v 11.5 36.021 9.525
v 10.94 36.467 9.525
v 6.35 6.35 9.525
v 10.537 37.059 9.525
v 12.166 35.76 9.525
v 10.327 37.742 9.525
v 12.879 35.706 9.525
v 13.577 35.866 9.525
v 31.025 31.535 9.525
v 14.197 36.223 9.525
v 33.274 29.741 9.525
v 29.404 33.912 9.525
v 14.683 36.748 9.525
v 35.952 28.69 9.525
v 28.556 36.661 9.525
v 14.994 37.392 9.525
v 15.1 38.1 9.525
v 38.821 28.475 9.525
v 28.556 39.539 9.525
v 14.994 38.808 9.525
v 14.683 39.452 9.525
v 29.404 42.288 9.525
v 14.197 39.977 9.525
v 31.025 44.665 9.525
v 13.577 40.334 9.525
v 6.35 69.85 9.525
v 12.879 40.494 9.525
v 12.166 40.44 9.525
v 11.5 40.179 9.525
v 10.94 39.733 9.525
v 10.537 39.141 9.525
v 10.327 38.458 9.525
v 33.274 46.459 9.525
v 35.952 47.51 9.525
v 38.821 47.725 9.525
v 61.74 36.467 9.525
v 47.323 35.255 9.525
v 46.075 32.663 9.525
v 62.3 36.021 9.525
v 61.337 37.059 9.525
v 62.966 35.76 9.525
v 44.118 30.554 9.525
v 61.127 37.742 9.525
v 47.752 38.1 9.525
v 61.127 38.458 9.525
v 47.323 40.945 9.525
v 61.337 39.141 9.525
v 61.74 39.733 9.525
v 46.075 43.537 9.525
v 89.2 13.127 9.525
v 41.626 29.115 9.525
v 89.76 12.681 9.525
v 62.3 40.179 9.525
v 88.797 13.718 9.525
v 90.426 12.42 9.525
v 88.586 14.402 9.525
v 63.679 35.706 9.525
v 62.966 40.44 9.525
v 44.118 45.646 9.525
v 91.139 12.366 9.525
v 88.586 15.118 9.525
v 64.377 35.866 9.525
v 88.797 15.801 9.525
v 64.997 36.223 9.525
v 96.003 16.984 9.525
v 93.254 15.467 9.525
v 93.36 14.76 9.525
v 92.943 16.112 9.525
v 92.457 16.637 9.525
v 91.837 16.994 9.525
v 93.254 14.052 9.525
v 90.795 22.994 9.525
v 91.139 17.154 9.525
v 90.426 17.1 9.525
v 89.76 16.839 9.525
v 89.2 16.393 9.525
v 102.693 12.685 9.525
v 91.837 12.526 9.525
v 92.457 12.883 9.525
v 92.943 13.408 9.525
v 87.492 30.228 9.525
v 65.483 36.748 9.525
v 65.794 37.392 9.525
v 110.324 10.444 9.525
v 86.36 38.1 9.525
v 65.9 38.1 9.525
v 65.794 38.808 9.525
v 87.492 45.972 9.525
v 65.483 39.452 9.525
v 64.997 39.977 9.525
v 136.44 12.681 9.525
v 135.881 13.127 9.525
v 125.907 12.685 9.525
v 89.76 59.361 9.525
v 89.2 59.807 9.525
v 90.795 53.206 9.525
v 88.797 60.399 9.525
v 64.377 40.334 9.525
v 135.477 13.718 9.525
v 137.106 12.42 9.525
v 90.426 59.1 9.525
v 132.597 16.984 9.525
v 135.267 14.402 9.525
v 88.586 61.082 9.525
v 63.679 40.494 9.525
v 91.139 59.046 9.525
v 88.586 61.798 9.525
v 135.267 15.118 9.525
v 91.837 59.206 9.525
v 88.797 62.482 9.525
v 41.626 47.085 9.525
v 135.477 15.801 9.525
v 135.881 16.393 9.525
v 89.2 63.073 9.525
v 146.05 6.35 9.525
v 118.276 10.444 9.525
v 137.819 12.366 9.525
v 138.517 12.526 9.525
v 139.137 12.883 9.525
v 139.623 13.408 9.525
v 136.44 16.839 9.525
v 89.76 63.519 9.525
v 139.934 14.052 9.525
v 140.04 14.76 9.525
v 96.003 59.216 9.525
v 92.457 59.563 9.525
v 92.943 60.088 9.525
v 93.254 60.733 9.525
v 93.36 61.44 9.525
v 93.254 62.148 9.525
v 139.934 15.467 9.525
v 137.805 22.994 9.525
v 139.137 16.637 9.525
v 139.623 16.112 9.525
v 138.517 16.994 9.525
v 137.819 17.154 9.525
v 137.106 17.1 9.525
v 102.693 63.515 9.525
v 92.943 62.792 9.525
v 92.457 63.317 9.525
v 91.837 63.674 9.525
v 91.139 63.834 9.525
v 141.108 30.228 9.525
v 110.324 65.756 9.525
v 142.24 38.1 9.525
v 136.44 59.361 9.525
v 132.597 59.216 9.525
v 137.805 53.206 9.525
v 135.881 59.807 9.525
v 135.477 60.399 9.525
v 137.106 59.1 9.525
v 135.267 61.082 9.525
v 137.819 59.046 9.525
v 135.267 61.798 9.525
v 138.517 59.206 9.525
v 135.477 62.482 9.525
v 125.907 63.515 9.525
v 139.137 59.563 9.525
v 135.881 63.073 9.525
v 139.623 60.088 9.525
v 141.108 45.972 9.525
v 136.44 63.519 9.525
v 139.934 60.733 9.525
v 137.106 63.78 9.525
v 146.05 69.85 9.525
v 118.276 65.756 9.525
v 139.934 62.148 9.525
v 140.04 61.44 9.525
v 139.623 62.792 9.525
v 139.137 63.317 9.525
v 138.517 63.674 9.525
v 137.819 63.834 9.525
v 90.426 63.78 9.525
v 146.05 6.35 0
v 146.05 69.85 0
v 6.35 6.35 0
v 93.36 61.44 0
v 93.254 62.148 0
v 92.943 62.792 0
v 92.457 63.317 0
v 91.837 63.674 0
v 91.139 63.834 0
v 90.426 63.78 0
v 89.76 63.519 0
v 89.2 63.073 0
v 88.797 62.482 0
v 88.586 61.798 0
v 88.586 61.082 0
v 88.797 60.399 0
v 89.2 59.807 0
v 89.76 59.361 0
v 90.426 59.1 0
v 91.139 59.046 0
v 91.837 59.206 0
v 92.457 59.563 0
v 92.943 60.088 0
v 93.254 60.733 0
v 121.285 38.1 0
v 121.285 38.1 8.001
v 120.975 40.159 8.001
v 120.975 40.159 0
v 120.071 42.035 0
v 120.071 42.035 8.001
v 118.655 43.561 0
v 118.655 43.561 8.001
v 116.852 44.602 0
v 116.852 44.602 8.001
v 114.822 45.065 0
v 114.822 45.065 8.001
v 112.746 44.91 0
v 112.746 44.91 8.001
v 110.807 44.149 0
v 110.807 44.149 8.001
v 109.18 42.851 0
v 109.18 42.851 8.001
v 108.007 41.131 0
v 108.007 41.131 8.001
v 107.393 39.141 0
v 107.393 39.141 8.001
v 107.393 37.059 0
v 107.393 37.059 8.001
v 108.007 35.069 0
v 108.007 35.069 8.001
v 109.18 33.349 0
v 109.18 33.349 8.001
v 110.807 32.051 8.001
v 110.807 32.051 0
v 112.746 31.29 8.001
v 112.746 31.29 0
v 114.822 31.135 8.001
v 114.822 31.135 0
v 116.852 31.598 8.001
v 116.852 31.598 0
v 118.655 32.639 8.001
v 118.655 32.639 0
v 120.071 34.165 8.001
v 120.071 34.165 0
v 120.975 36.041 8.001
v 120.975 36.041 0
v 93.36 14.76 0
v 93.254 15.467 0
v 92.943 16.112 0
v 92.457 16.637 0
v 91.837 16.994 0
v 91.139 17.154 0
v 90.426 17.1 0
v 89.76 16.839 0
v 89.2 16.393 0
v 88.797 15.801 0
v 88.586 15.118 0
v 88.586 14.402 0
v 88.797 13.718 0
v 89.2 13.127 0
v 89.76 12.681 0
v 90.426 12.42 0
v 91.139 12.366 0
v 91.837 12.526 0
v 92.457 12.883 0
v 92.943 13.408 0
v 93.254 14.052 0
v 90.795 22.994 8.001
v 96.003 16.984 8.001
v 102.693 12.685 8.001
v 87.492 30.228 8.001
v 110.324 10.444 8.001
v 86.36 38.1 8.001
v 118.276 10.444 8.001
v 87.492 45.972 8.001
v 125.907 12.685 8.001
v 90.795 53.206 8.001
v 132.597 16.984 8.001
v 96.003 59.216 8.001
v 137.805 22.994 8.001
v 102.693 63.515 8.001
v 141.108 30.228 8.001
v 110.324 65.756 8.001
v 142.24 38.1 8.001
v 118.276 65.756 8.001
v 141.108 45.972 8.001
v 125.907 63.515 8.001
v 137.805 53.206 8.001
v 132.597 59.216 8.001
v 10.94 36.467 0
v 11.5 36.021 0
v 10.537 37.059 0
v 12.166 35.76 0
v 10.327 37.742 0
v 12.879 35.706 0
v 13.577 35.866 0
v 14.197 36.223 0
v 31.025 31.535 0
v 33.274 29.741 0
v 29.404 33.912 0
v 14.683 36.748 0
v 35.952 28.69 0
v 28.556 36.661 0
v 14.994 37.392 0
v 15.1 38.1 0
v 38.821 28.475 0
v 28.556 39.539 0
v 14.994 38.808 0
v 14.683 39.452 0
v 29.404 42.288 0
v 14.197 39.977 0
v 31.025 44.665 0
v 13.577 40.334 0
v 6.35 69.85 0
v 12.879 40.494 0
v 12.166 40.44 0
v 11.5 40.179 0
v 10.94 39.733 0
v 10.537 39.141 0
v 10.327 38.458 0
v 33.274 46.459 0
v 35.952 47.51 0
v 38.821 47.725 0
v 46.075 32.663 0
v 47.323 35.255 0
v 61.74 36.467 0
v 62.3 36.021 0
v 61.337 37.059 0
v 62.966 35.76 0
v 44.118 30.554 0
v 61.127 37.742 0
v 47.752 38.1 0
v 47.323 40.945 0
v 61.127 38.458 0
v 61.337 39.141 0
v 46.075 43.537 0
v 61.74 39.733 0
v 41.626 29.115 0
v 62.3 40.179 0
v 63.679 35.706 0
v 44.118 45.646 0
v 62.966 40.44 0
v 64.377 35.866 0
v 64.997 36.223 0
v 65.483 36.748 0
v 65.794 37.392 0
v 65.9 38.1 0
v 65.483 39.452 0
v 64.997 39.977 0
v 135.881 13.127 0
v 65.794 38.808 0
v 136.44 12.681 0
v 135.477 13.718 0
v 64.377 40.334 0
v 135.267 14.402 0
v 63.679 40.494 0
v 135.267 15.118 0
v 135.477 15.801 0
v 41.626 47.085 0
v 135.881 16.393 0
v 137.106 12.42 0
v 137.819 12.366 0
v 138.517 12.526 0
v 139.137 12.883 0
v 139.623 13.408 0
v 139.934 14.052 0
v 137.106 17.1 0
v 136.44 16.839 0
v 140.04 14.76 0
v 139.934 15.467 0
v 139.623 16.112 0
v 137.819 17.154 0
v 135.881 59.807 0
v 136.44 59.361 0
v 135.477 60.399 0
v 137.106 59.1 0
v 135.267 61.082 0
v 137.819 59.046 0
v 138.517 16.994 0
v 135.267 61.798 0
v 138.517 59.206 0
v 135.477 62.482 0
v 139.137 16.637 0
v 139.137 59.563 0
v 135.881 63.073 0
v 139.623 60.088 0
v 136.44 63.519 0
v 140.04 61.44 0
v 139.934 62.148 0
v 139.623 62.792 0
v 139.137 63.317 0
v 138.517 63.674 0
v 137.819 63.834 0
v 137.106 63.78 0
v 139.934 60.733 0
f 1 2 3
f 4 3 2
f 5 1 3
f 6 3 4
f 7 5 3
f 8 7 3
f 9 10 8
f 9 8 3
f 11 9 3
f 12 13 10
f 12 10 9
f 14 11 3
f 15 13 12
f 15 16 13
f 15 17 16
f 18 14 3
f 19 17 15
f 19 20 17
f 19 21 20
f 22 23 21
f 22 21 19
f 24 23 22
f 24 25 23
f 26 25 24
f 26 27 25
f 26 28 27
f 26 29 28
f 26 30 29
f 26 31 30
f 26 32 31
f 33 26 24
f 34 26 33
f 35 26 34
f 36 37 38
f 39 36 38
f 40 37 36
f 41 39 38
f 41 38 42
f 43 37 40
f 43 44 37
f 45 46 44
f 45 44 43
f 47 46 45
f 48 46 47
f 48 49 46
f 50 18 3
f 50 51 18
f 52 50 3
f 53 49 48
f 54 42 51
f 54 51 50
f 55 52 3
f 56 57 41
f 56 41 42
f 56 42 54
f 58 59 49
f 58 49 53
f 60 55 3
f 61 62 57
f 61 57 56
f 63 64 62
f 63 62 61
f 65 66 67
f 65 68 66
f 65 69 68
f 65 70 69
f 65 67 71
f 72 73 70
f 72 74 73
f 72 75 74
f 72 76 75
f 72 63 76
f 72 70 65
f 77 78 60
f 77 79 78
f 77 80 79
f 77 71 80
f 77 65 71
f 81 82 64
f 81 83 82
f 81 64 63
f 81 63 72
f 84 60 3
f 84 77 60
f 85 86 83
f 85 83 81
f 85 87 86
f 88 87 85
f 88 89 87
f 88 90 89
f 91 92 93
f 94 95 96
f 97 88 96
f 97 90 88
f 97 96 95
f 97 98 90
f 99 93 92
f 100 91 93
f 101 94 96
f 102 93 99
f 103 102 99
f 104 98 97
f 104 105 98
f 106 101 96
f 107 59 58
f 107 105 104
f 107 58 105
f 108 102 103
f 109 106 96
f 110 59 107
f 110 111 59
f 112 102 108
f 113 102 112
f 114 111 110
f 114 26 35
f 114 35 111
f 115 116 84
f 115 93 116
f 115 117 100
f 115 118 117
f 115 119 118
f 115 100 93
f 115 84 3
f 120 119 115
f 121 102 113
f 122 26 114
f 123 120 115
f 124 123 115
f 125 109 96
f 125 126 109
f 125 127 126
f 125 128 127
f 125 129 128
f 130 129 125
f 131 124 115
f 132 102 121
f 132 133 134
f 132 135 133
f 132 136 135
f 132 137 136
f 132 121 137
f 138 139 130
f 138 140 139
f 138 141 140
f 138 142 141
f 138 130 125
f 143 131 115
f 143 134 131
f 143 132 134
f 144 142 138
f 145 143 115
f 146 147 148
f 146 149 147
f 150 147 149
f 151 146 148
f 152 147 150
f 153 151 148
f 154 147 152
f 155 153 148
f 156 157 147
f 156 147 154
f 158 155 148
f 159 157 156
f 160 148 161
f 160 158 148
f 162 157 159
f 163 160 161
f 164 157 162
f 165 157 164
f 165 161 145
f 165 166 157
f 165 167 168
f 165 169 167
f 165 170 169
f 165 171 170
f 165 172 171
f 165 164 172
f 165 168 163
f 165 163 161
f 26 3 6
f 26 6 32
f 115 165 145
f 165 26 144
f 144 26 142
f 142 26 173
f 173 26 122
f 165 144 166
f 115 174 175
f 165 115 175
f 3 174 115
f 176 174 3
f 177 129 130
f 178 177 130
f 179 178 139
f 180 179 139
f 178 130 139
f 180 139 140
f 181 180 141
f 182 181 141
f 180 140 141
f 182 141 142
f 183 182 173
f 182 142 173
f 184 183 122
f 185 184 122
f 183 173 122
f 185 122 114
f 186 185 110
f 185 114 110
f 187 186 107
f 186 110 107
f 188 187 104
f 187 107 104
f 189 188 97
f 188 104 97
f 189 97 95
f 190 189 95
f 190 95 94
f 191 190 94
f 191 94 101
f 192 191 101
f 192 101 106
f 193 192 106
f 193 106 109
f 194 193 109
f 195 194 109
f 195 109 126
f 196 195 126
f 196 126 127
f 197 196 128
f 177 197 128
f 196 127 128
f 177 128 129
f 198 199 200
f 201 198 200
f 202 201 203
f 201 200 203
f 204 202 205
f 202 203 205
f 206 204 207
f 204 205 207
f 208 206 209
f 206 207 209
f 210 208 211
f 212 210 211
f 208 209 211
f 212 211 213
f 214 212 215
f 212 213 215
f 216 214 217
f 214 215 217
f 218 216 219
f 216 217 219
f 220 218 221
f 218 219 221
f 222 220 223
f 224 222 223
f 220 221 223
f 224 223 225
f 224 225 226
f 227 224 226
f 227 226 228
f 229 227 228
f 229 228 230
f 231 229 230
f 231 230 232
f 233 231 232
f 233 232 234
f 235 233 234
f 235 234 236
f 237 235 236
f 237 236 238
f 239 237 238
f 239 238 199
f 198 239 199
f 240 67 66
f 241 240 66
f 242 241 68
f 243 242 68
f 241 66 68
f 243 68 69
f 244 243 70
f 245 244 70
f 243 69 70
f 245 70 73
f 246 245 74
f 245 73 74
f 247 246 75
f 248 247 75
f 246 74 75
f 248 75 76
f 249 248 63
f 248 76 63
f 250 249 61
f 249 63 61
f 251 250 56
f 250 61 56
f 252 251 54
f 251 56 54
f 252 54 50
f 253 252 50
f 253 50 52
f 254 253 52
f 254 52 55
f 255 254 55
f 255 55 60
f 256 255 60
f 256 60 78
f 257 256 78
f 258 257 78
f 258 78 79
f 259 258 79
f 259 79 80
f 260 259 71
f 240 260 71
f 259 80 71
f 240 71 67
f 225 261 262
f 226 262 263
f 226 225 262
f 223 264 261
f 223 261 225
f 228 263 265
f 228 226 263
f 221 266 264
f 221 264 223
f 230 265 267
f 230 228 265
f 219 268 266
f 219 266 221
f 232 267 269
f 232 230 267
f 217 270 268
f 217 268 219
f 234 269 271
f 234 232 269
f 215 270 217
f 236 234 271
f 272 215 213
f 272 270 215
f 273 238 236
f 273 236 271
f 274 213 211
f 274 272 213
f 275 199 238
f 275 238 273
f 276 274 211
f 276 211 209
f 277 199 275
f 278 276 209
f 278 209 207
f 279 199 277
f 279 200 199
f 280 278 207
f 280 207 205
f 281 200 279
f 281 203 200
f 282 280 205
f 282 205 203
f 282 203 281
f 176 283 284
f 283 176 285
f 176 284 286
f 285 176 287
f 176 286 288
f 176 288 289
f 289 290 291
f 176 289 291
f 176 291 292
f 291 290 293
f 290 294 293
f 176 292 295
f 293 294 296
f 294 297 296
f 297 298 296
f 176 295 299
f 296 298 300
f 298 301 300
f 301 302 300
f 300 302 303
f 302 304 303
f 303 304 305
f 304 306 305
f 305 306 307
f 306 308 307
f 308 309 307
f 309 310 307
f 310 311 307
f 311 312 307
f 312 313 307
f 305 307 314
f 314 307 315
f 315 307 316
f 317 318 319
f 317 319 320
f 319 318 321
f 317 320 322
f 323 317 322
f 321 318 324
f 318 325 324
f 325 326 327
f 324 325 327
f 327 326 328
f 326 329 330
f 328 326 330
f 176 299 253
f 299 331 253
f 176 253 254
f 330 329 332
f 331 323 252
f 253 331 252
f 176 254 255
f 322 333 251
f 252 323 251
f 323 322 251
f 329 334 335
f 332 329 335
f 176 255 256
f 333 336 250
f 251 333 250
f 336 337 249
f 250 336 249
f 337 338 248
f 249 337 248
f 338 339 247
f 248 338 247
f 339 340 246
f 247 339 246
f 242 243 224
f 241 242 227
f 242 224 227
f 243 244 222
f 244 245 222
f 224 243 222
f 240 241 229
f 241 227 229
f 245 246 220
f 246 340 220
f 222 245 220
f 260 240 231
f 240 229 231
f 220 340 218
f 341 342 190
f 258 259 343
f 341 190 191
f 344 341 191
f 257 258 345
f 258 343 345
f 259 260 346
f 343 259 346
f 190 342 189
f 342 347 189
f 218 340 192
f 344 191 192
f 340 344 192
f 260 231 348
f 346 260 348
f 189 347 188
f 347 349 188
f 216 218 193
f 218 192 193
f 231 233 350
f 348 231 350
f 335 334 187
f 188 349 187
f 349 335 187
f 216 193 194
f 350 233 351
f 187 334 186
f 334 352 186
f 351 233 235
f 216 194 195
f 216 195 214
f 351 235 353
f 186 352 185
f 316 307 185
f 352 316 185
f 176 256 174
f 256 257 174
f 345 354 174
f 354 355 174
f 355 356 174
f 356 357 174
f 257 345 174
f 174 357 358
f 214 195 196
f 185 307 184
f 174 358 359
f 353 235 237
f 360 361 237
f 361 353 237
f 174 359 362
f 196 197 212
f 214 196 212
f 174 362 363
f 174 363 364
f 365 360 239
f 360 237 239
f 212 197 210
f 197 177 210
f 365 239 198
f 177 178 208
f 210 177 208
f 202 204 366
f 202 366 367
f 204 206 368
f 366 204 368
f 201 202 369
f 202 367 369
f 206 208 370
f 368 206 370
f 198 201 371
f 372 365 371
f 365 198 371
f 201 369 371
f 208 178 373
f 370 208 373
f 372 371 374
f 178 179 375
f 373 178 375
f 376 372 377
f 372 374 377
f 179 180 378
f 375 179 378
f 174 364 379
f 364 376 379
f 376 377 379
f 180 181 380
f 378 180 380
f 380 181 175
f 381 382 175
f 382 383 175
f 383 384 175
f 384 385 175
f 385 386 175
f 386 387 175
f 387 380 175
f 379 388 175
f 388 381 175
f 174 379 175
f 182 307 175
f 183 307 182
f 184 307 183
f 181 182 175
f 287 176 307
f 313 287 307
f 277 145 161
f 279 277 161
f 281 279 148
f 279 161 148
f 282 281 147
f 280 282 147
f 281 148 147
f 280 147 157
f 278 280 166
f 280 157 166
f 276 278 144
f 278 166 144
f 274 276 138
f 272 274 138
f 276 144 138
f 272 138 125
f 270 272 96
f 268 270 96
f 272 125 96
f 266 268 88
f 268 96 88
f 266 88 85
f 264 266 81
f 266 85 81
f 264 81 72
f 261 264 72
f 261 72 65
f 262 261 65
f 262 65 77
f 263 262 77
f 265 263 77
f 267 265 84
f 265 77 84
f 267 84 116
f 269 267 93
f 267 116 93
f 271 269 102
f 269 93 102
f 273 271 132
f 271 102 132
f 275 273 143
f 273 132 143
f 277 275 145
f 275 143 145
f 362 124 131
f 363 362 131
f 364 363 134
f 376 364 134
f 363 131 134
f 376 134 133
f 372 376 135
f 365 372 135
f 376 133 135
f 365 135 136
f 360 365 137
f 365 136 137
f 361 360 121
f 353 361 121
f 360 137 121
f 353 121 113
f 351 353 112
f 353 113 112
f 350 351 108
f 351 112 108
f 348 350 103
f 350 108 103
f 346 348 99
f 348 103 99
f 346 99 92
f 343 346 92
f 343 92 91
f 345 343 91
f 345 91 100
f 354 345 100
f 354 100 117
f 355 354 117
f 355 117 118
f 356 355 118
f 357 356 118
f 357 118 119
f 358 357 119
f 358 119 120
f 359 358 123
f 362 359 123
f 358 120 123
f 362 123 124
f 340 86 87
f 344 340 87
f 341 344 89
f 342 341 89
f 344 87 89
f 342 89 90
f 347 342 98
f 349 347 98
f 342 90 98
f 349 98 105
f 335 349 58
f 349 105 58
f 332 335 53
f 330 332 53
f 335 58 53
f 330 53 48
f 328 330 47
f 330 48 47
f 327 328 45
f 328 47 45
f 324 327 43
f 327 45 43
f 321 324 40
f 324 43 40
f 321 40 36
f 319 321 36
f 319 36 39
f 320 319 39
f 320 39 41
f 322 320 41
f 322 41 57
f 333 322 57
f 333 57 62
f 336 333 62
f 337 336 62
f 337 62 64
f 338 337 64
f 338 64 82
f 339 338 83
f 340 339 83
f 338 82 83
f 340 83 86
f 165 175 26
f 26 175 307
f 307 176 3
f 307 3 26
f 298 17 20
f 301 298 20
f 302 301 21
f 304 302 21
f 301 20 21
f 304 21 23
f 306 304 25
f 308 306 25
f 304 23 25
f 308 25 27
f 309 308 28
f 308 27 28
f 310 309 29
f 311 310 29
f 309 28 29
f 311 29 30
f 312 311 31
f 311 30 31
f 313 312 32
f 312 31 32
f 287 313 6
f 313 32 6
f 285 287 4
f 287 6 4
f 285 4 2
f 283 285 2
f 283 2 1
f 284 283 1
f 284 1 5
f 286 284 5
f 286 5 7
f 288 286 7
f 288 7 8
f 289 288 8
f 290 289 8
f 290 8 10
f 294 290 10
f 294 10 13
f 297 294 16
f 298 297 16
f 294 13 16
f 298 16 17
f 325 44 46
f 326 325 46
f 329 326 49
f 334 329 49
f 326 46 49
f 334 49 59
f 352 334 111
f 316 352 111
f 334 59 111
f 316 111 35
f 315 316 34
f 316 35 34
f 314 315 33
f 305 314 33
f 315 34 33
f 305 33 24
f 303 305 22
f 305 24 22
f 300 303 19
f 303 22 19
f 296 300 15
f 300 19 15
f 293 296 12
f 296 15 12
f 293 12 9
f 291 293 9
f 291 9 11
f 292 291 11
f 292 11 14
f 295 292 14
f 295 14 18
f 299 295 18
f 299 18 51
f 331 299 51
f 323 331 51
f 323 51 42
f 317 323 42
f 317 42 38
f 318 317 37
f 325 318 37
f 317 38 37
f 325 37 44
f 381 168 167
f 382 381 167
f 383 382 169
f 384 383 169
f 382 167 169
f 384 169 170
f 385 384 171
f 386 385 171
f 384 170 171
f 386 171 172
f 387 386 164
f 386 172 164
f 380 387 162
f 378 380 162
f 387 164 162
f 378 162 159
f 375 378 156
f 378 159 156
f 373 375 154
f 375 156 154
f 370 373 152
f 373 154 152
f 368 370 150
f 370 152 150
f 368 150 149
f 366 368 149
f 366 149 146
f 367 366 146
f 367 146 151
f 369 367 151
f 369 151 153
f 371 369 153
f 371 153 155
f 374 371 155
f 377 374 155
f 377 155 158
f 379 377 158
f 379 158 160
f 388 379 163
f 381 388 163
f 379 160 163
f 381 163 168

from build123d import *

# Parameters (mm, degrees)
SKETCH1_W           = 152.4
SKETCH1_H           = 76.2
BOSS_EXTRUDE1_DEPTH = 9.525
SKETCH2_R           = 9.652
SKETCH2_R_2         = 6.985
SKETCH2_R_3         = 2.4003
CUT_EXTRUDE1_DEPTH  = 9.525
SKETCH3_R           = 27.94
CUT_EXTRUDE2_DEPTH  = 1.524
SKETCH4_W           = 152.4
SKETCH4_H           = 76.2
SKETCH4_W_2         = 139.7
SKETCH4_H_2         = 63.5
CUT_EXTRUDE3_DEPTH  = 10.525


with BuildPart() as part:
    # Sketch1 → Boss-Extrude1 (new body)
    with BuildSketch(Plane.XY):
        with Locations((76.2, 38.1)):
            Rectangle(SKETCH1_W, SKETCH1_H)
    extrude(amount=BOSS_EXTRUDE1_DEPTH)

    # Sketch2 → Cut-Extrude1 (cut)
    with BuildSketch(Plane.XY.offset(9.525)):
        with Locations((38.1, 38.1)):
            Circle(SKETCH2_R)
        with Locations((114.3, 38.1)):
            Circle(SKETCH2_R_2)
        with Locations((12.7, 38.1)):
            Circle(SKETCH2_R_3)
        with Locations((63.5, 38.1)):
            Circle(SKETCH2_R_3)
        with Locations((90.95994, 61.44006)):
            Circle(SKETCH2_R_3)
        with Locations((137.64006, 61.44006)):
            Circle(SKETCH2_R_3)
        with Locations((90.95994, 14.75994)):
            Circle(SKETCH2_R_3)
        with Locations((137.64006, 14.75994)):
            Circle(SKETCH2_R_3)
    extrude(amount=-CUT_EXTRUDE1_DEPTH, mode=Mode.SUBTRACT)

    # Sketch3 → Cut-Extrude2 (cut)
    with BuildSketch(Plane.XY.offset(9.525)):
        with Locations((114.3, 38.1)):
            Circle(SKETCH3_R)
    extrude(amount=-CUT_EXTRUDE2_DEPTH, mode=Mode.SUBTRACT)

    # Sketch4 → Cut-Extrude3 (cut, through all)
    with BuildSketch(Plane(origin=(0, 0, 0), x_dir=(-1, 0, 0), z_dir=(0, 0, -1))):
        with Locations((-76.2, 38.1)):
            Rectangle(SKETCH4_W, SKETCH4_H)
        with Locations((-76.2, 38.1)):
            Rectangle(SKETCH4_W_2, SKETCH4_H_2, mode=Mode.SUBTRACT)
    extrude(amount=-CUT_EXTRUDE3_DEPTH, mode=Mode.SUBTRACT)


solid = part.part
